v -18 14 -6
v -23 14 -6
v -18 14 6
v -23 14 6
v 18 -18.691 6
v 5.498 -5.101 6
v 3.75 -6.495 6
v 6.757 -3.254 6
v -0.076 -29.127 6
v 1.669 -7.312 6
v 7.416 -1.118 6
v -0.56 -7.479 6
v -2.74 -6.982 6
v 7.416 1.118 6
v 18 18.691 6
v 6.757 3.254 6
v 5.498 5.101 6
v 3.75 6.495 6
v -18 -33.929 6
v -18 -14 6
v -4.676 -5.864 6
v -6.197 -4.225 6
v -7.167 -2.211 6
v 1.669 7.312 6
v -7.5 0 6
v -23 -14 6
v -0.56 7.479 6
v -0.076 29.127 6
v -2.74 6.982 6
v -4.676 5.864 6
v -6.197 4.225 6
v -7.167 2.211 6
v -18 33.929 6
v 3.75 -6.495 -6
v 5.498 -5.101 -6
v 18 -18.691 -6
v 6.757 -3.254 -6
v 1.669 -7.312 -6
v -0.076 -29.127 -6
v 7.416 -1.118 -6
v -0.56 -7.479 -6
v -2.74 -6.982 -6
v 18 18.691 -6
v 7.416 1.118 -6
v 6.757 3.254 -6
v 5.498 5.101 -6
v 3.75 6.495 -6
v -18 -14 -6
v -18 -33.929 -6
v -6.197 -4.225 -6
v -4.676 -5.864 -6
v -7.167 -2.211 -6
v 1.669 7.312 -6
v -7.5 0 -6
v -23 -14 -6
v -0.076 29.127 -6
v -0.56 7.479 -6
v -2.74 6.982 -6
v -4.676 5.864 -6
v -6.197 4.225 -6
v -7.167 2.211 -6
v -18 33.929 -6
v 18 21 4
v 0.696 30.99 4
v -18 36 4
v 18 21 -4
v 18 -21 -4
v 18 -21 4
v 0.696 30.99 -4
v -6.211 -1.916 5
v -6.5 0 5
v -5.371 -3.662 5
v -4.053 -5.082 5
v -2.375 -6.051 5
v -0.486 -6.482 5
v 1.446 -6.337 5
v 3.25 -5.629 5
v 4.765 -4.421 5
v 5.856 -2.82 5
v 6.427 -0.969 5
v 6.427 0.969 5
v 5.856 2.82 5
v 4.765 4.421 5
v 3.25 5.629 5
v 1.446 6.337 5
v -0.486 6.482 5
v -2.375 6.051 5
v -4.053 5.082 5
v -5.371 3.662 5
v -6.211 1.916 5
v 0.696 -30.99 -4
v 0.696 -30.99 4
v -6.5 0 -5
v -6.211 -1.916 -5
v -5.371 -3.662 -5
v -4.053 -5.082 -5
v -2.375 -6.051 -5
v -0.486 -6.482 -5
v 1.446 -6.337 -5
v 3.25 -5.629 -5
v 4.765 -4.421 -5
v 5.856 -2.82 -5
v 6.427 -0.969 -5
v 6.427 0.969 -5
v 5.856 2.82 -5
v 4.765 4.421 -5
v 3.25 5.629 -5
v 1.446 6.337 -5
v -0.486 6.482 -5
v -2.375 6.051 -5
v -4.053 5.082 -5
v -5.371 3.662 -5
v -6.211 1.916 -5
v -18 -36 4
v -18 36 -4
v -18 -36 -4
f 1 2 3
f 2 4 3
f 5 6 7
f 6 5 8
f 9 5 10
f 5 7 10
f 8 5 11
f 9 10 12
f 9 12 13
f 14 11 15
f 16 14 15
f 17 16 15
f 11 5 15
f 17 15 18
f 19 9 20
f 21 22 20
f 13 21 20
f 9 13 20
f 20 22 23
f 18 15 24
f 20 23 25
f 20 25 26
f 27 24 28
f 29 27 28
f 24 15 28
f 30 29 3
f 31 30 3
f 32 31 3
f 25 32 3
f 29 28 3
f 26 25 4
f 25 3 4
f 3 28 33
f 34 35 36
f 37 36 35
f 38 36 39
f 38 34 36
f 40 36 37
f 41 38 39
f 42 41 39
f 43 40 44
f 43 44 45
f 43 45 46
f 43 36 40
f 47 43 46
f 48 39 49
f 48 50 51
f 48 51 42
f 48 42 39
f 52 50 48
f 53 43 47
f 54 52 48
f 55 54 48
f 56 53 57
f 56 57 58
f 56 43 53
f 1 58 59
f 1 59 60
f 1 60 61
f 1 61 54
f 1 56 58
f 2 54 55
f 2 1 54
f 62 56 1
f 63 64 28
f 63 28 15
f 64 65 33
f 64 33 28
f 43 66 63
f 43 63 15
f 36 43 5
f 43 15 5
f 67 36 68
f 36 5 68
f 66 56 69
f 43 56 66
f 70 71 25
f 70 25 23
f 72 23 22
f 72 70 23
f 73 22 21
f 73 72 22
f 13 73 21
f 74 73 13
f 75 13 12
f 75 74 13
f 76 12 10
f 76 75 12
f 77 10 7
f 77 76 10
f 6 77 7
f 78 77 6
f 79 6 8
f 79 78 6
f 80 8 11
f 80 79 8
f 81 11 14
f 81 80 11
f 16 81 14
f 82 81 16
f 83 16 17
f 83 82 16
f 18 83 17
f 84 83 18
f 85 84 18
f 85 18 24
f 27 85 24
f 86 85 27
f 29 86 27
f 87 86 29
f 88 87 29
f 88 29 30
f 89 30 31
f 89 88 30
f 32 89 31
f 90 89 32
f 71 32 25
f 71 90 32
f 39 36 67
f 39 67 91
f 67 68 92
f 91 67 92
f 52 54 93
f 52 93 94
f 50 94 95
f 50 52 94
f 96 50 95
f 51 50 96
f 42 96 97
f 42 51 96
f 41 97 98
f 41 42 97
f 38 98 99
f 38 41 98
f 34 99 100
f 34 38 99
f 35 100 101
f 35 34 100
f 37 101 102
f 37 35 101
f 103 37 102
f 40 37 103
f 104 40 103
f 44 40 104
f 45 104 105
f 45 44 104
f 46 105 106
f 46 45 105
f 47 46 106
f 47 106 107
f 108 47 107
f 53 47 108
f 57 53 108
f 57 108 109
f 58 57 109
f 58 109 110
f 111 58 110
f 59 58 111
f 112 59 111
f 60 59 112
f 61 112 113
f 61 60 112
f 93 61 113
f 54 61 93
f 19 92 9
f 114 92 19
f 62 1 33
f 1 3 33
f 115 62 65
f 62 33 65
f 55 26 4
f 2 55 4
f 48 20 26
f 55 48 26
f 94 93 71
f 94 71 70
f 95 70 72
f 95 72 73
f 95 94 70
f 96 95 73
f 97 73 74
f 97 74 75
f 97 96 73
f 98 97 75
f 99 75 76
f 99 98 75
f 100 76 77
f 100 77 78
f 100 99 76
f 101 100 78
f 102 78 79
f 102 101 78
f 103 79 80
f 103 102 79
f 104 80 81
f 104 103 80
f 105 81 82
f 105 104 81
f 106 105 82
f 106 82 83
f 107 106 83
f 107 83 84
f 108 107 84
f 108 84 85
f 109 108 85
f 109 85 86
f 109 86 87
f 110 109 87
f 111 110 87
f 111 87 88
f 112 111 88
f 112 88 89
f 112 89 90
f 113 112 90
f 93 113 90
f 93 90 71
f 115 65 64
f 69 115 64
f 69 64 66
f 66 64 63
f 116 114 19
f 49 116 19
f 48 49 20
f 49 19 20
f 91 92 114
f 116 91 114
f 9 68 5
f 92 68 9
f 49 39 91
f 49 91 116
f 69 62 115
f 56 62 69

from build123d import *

# Parameters (mm, degrees)
SKETCH_1_R      = 6.5
EXTRUDE_1_DEPTH = 6
CHAMFER_1_SIZE  = 2
CHAMFER_2_SIZE  = 1


with BuildPart() as part:
    # 草图1 → 凸台-拉伸1 (new, symmetric)
    with BuildSketch(Plane.XY):
        Polygon((-23, -14), (-23, 14), (-18, 14), (-18, 36), (0.696152423, 30.990381057), (18, 21), (18, -21), (0.696152423, -30.990381057), (-18, -36), (-18, -14), align=None)
        with Locations(Location((0, 0, 0), (0, 0, 180))):
            Circle(SKETCH_1_R, mode=Mode.SUBTRACT)
    extrude(amount=EXTRUDE_1_DEPTH, both=True)

    # 倒角1
    chamfer_1_edges = [part.edges().sort_by_distance(p)[0] for p in [
        (-8.651923789, -33.495190528, -6),
        (9.348076211, -25.995190528, -6),
        (9.348076211, 25.995190528, 6),
        (9.348076211, 25.995190528, -6),
        (-8.651923789, 33.495190528, -6),
        (9.348076211, -25.995190528, 6),
        (-8.651923789, -33.495190528, 6),
        (-8.651923789, 33.495190528, 6),
    ]]
    chamfer(chamfer_1_edges, length=CHAMFER_1_SIZE)

    # 倒角2
    chamfer_2_edges = [part.edges().sort_by_distance(p)[0] for p in [
        (6.5, 0, 6),
        (6.5, 0, -6),
    ]]
    chamfer(chamfer_2_edges, length=CHAMFER_2_SIZE)


solid = part.part
